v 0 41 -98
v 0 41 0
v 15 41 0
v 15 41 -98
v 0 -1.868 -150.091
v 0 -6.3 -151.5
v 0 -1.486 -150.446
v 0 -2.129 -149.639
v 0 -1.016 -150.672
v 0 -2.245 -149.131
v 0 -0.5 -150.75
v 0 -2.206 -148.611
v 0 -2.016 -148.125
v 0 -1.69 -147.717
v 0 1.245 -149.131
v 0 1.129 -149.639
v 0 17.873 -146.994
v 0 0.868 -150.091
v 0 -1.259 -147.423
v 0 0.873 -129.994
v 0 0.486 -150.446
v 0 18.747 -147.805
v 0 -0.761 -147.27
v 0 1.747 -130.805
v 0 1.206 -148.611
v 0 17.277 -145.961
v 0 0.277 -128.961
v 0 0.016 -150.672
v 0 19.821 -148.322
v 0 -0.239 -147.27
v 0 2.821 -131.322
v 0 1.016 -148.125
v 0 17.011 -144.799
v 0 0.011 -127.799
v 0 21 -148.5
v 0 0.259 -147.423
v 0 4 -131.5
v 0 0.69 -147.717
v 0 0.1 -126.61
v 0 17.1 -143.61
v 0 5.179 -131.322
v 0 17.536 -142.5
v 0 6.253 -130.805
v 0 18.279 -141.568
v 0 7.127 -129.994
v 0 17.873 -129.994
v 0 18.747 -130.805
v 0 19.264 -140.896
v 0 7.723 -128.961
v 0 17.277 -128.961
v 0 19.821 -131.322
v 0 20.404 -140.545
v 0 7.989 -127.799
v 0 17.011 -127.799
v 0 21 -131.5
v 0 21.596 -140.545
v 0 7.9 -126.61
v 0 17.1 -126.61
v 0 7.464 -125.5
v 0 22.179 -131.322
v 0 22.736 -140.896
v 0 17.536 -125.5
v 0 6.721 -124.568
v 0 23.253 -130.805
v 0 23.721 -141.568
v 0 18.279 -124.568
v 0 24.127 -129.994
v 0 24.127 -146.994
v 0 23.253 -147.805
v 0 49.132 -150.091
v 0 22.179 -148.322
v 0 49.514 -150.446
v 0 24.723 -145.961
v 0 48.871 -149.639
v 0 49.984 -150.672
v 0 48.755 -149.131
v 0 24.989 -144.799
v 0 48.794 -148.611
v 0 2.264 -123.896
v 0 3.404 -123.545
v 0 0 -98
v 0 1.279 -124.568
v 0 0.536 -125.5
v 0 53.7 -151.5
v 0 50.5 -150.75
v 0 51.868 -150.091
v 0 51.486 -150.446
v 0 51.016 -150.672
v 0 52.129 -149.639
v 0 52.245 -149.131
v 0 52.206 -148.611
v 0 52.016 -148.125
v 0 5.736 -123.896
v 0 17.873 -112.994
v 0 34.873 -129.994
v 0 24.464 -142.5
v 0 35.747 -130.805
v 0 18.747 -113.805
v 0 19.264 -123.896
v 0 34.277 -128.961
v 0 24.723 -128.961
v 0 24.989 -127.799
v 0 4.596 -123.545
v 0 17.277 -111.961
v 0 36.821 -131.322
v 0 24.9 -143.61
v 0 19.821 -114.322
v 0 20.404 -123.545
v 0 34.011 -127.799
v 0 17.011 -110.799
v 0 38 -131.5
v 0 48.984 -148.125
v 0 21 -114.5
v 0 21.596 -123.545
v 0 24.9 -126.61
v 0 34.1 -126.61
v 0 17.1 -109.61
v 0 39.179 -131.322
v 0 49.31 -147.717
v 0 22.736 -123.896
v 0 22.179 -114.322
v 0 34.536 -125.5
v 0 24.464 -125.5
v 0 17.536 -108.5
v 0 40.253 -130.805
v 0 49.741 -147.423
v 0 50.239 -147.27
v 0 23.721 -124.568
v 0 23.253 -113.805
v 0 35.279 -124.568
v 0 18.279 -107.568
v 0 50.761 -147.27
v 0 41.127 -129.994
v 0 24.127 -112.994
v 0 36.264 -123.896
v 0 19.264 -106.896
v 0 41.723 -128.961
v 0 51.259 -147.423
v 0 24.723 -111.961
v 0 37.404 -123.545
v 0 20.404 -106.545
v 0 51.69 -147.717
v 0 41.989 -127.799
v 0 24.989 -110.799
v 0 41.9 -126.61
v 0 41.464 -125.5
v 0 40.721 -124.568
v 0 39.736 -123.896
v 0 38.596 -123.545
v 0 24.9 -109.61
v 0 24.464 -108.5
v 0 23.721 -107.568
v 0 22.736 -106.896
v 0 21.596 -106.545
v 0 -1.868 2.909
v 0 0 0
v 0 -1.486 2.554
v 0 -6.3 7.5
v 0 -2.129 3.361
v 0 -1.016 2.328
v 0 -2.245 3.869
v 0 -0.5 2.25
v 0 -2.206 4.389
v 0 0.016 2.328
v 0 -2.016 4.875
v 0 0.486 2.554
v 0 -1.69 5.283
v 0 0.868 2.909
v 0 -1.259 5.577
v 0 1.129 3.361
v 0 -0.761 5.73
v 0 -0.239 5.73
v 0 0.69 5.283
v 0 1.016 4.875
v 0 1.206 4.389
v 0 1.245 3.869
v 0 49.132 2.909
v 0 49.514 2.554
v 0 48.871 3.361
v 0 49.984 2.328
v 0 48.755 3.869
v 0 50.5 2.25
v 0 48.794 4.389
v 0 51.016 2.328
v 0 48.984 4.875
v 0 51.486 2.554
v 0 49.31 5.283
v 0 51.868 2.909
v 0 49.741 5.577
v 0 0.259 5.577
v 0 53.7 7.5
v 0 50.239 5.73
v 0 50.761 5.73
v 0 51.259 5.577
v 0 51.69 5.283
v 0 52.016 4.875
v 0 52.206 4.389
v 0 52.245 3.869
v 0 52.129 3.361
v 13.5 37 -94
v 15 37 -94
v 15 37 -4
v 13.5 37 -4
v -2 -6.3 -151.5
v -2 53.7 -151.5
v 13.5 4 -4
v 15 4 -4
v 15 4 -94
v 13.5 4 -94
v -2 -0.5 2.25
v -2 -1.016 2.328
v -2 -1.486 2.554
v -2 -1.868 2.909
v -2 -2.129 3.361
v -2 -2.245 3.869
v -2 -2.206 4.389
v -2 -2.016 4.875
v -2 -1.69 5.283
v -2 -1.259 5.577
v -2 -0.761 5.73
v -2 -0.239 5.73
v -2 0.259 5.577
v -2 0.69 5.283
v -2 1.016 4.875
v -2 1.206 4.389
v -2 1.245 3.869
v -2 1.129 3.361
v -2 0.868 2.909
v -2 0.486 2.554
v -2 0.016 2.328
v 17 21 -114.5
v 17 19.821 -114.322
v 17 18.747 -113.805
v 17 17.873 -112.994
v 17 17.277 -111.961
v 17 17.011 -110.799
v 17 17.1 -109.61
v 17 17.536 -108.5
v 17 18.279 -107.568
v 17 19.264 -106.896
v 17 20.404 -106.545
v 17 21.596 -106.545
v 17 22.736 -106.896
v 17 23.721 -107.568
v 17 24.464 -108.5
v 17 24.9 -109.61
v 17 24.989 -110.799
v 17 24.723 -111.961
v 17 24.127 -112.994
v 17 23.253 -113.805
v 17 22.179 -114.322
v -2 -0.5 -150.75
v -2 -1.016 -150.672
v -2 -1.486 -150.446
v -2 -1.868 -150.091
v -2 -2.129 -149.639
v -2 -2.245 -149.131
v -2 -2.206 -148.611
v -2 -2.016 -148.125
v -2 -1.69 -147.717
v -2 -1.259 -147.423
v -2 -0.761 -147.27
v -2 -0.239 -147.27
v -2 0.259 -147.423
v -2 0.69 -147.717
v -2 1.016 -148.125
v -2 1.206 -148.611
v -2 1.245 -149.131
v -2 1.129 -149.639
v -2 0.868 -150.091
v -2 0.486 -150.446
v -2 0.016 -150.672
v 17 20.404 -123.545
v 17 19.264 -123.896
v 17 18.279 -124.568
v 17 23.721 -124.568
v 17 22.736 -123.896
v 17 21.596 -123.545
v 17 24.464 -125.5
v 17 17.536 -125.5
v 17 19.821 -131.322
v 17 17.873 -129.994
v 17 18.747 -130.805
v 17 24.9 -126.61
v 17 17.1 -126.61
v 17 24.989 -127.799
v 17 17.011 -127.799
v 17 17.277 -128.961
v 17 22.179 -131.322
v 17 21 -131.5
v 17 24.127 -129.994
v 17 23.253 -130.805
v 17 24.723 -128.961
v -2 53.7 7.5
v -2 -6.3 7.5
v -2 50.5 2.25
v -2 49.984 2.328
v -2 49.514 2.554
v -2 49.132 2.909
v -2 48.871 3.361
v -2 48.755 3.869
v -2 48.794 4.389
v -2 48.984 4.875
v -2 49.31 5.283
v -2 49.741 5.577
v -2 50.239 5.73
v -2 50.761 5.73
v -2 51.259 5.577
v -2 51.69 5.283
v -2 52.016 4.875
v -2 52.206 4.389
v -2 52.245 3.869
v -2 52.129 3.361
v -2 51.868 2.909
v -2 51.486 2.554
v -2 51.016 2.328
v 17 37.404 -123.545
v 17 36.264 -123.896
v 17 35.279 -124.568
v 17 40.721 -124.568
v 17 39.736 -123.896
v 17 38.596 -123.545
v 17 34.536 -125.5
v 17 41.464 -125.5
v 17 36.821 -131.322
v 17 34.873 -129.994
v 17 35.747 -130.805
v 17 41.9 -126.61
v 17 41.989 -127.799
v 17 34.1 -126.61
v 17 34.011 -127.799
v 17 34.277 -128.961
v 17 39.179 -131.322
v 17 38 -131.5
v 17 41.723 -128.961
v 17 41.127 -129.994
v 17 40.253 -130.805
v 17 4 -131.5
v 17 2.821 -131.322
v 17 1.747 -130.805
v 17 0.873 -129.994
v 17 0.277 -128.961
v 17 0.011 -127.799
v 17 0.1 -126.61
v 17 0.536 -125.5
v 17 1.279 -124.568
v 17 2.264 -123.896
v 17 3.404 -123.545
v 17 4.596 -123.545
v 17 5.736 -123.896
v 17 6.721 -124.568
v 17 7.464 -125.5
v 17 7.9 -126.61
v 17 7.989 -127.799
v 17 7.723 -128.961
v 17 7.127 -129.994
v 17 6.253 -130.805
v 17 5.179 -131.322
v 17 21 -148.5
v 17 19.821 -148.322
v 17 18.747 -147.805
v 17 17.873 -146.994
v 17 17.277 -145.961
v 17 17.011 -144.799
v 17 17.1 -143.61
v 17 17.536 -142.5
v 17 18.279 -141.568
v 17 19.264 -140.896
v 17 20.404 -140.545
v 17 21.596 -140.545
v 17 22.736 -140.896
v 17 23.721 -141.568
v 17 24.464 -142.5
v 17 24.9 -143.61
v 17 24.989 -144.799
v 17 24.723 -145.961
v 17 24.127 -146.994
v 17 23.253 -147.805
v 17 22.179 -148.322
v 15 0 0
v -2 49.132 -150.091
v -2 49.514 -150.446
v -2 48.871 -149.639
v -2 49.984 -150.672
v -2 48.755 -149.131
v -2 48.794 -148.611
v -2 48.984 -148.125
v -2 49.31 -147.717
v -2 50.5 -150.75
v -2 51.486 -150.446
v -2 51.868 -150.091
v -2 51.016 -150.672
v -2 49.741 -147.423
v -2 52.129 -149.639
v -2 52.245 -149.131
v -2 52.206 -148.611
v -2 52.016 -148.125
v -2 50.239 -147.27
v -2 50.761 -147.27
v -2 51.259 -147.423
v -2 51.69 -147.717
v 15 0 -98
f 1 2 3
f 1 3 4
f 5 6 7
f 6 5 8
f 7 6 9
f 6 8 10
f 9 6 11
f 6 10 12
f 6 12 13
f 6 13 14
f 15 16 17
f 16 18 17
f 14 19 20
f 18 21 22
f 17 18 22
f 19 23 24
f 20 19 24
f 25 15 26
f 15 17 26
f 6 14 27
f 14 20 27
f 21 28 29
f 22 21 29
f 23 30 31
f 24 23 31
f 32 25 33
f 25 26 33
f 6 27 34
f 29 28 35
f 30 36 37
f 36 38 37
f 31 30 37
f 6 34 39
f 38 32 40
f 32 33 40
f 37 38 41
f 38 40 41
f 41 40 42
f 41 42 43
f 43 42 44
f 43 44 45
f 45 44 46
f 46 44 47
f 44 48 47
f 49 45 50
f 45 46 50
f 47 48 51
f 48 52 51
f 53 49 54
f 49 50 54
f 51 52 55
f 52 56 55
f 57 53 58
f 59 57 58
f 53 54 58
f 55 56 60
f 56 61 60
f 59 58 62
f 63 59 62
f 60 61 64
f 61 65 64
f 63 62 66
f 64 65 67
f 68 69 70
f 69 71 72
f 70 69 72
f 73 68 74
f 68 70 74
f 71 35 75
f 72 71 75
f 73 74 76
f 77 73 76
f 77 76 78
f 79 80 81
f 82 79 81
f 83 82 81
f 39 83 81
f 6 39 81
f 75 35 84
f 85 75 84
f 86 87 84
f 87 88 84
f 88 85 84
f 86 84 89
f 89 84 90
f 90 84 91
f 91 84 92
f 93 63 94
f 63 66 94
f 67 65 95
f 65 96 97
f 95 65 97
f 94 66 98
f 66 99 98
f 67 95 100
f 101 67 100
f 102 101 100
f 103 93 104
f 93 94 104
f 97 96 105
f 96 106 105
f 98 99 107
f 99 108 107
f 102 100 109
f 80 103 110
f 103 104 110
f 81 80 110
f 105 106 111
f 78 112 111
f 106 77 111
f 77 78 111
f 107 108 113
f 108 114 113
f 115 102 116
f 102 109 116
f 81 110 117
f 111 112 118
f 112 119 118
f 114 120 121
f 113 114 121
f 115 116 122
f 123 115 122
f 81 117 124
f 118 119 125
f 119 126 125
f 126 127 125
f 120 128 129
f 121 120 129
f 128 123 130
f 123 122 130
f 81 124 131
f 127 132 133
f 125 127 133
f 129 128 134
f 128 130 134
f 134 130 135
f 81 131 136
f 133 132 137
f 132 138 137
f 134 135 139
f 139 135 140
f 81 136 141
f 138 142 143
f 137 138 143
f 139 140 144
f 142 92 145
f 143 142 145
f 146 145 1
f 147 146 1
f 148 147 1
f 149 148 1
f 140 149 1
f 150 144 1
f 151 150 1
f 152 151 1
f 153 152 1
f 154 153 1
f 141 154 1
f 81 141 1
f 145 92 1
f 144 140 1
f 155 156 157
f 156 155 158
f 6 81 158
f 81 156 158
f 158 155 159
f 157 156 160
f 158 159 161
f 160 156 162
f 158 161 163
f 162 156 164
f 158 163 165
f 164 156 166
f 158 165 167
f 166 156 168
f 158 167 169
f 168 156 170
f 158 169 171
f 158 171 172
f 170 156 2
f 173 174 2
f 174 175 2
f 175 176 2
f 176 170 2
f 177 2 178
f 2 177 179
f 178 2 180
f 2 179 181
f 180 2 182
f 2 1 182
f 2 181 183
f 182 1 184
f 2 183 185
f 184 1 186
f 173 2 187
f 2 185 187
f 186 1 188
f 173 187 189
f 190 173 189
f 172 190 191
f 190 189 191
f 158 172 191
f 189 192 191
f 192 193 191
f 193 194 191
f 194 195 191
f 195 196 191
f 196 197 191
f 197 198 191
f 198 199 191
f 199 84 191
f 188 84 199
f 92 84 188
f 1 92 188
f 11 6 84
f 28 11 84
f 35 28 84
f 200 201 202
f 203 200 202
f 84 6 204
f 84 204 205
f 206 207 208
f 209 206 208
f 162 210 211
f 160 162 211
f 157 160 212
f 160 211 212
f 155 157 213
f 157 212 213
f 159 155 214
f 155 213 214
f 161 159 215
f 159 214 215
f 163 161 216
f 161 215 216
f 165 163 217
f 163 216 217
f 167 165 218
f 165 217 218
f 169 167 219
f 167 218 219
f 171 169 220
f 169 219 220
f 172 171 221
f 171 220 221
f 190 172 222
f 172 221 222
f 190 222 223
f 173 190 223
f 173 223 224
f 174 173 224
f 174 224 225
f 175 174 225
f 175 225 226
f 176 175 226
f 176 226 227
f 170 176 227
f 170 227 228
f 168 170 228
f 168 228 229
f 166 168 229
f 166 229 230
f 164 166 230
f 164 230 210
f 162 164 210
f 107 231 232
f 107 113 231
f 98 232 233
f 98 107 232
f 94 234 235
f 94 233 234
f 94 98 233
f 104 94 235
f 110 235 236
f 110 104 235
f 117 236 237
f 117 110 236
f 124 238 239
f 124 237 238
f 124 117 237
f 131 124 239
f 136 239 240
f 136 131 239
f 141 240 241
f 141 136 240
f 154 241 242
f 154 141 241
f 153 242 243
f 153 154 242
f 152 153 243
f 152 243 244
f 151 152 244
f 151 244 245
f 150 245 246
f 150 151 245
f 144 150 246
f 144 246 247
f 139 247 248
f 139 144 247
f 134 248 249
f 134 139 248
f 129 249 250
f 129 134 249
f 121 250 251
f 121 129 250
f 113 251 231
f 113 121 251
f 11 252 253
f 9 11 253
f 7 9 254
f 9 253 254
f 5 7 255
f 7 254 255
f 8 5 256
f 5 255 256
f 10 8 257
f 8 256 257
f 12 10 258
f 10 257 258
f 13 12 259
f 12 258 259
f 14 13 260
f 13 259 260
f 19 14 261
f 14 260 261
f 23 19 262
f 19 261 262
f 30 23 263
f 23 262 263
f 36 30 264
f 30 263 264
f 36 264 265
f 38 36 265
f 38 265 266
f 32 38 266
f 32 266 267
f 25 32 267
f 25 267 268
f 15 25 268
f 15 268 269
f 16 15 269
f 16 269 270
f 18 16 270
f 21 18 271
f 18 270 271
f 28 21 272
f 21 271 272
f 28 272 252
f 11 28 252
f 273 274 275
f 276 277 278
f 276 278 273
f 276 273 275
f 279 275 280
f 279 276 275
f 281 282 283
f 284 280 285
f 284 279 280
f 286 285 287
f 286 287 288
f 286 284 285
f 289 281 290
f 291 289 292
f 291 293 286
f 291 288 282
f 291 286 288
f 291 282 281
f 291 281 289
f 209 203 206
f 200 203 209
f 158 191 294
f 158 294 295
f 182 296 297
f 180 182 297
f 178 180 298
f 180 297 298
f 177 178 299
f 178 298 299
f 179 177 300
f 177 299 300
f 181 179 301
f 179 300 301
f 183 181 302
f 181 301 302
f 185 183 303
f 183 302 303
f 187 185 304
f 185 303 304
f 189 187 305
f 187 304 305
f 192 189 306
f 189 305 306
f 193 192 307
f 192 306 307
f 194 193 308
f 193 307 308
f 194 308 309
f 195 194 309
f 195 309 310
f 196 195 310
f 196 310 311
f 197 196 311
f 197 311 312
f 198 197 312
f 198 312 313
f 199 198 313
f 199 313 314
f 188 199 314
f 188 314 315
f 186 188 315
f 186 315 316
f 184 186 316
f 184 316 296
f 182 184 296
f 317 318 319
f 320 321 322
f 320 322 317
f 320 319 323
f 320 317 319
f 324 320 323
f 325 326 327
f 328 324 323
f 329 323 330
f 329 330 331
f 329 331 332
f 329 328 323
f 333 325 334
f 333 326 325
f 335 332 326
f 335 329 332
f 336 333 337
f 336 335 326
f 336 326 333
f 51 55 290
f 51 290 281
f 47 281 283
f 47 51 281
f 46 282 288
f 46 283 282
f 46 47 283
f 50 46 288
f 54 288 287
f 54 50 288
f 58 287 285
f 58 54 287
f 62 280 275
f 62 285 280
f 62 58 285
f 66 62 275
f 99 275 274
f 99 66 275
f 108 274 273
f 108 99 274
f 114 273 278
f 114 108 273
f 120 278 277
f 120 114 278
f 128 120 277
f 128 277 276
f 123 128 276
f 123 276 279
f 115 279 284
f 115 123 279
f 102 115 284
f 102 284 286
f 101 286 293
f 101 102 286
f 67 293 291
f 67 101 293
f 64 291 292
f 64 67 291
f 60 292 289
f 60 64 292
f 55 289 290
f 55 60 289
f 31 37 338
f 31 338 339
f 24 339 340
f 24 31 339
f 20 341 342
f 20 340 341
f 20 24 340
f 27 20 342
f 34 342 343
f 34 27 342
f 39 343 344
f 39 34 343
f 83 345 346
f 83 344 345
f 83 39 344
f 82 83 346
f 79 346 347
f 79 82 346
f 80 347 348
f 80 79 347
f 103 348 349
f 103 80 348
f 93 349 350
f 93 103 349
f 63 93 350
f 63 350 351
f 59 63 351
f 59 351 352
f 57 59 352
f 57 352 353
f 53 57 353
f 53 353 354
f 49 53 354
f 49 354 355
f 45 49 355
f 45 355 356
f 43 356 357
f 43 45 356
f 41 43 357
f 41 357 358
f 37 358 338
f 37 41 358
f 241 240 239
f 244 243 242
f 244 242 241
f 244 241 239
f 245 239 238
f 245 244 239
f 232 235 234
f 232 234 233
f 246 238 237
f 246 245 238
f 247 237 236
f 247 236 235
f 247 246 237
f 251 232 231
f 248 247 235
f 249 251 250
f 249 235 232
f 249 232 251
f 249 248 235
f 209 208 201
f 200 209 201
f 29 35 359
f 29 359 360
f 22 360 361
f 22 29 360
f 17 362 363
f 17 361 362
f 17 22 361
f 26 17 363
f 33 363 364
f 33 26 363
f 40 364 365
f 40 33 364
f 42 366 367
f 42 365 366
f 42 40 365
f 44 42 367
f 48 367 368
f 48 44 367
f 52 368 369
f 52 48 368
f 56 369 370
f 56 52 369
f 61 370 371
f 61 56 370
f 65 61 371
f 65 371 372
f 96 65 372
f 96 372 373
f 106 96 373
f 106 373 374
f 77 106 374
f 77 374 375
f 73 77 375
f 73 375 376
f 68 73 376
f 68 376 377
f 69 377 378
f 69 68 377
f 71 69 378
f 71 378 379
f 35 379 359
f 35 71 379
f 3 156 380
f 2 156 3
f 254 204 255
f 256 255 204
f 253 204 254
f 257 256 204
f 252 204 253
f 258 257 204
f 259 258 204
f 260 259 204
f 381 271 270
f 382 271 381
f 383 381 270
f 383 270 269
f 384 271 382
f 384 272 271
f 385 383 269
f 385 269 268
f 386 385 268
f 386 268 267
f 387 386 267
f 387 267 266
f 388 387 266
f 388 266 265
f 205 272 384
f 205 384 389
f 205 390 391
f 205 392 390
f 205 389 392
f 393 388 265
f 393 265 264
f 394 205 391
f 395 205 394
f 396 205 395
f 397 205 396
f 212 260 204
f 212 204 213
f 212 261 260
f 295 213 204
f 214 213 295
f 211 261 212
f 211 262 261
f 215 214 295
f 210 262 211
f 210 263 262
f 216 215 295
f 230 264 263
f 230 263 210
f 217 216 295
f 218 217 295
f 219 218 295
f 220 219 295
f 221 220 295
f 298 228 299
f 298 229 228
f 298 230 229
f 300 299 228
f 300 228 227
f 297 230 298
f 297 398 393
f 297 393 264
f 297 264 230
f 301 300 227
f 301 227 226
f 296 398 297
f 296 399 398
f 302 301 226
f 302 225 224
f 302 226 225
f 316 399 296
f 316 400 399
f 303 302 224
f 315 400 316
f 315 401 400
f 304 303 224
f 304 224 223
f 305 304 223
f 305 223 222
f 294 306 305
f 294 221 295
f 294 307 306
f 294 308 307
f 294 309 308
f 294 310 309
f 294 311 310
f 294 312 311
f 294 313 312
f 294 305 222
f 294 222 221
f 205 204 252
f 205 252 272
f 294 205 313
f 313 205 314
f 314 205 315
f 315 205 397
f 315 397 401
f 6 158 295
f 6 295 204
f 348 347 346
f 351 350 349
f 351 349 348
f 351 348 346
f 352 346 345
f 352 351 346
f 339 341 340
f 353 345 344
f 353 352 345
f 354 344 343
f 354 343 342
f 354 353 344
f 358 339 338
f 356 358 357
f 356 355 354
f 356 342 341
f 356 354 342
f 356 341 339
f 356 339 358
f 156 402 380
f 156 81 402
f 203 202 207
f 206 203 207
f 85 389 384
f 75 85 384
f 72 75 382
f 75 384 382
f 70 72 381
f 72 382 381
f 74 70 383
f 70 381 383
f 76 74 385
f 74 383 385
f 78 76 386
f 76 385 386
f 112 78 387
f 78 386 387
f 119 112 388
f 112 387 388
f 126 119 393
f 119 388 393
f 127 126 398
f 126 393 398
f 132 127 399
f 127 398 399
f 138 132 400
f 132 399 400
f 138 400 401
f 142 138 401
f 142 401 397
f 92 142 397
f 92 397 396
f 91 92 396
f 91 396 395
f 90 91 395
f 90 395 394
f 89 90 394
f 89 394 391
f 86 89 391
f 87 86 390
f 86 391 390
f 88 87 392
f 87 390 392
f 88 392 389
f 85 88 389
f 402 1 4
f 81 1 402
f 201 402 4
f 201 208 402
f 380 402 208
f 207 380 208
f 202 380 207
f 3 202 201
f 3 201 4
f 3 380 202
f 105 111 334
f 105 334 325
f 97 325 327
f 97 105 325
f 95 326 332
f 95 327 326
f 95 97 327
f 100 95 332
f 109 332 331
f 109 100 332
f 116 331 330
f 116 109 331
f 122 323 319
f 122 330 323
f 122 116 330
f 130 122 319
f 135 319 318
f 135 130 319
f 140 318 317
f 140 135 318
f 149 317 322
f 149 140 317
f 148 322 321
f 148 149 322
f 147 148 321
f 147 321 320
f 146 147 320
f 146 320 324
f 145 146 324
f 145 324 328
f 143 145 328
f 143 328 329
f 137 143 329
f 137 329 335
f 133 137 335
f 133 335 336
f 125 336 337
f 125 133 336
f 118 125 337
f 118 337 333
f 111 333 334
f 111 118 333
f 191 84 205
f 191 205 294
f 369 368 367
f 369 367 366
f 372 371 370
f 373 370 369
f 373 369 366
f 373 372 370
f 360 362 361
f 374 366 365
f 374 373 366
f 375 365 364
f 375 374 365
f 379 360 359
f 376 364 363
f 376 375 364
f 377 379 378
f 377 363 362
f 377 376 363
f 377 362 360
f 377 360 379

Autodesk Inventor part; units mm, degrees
ref_plane "YZ Plane" through (0, 0, 0) normal (1, 0, 0) x (0, 1, 0)
ref_plane "XZ Plane" through (0, 0, 0) normal (0, 1, 0) x (-1, 0, 0)
ref_plane "XY Plane" through (0, 0, 0) normal (0, 0, 1) x (1, 0, 0)
sketch "Szkic1" plane through (0, 0, 0) normal (1, 0, 0) x (0, 1, 0)
  line L0 (0, 0) -> (41, 0)
  line L1 (41, 0) -> (41, -98)
  line L2 (41, -98) -> (0, -98)
  line L3 (0, -98) -> (0, 0)
  dimension "d0" = 98
  dimension "d1" = 41
extrude "Wyciągnięcie proste1" add sketch "Szkic1" along normal blind 15
sketch "Szkic2" plane through (15, 0, 0) normal (1, 0, 0) x (0, 0, -1)
  line L0 (4, 4) -> (94, 4)
  line L1 (94, 4) -> (94, 37)
  line L2 (94, 37) -> (4, 37)
  line L3 (4, 37) -> (4, 4)
  line L4 (49, 37) -> (49, 41) construction
  line L5 (98, 41) -> (0, 41) projected
  line L6 (94, 20.5) -> (98, 20.5) construction
  line L7 (98, 0) -> (98, 41) projected
  point P0 (0, 0)
  dimension "d4" = 90
  dimension "d5" = 33
extrude "Wyciągnięcie proste2" cut sketch "Szkic2" against normal blind 1.5
sketch "Szkic3" plane through (0, 0, 0) normal (-1, 0, 0) x (0, 0, 1)
  line L0 (-151.5, 53.7) -> (7.5, 53.7)
  line L1 (7.5, 53.7) -> (7.5, -6.3)
  line L2 (7.5, -6.3) -> (-151.5, -6.3)
  line L3 (-151.5, -6.3) -> (-151.5, 53.7)
  line L4 (-98, 41) -> (0, 41) projected
  line L5 (0, 41) -> (0, 0) projected
  line L6 (-98, 0) -> (0, 0) projected
  dimension "d8" = 159
  dimension "d9" = 60
  dimension "d10" = 7.5
  dimension "d11" = 6.3
extrude "Wyciągnięcie proste3" add sketch "Szkic3" along normal blind 2
sketch "Szkic4" plane through (0, 0, 0) normal (1, 0, 0) x (0, 0, -1)
  line L0 (110.5, 21) -> (144.5, 21) construction
  line L1 (127.5, 4) -> (127.5, 38) construction
  line L2 (98, 40.528) -> (98, -0.472) construction
  line L3 (98, 0) -> (98, 41) projected
  line L4 (0, 0) -> (98, 0) projected
  circle A0 centre (127.5, 38) radius 4
  circle A1 centre (110.5, 21) radius 4
  circle A2 centre (144.5, 21) radius 4
  circle A3 centre (127.5, 4) radius 4
  circle A4 centre (127.5, 21) radius 4
  dimension "d14" = 34
  dimension "d15" = 34
  dimension "d16" = 29.5
  dimension "d17" = 4
  dimension "d18" = 8
sketch "Szkic5" plane through (0, 0, 0) normal (1, 0, 0) x (0, 0, -1)
  line L0 (-4, -0.5) -> (149, -0.5) construction
  line L1 (149, -0.5) -> (149, 50.5) construction
  line L2 (149, 50.5) -> (-4, 50.5) construction
  line L3 (-4, 50.5) -> (-4, -0.5) construction
  line L4 (0, 41) -> (0, 0) projected
  line L5 (0, 0) -> (98, 0) projected
  dimension "d21" = 51
  dimension "d22" = 153
  dimension "d23" = 4
  dimension "d24" = 0.5
hole "Otwór1" at (0, -0.5, -149) at (0, 50.5, -149) at (0, 50.5, 4) at (0, -0.5, 4) direction (-1, 0, 0) diameter 3.5 end through all
extrude "Wyciągnięcie proste5" add sketch "Szkic4" along normal blind 17
properties part number "27_LCD"
